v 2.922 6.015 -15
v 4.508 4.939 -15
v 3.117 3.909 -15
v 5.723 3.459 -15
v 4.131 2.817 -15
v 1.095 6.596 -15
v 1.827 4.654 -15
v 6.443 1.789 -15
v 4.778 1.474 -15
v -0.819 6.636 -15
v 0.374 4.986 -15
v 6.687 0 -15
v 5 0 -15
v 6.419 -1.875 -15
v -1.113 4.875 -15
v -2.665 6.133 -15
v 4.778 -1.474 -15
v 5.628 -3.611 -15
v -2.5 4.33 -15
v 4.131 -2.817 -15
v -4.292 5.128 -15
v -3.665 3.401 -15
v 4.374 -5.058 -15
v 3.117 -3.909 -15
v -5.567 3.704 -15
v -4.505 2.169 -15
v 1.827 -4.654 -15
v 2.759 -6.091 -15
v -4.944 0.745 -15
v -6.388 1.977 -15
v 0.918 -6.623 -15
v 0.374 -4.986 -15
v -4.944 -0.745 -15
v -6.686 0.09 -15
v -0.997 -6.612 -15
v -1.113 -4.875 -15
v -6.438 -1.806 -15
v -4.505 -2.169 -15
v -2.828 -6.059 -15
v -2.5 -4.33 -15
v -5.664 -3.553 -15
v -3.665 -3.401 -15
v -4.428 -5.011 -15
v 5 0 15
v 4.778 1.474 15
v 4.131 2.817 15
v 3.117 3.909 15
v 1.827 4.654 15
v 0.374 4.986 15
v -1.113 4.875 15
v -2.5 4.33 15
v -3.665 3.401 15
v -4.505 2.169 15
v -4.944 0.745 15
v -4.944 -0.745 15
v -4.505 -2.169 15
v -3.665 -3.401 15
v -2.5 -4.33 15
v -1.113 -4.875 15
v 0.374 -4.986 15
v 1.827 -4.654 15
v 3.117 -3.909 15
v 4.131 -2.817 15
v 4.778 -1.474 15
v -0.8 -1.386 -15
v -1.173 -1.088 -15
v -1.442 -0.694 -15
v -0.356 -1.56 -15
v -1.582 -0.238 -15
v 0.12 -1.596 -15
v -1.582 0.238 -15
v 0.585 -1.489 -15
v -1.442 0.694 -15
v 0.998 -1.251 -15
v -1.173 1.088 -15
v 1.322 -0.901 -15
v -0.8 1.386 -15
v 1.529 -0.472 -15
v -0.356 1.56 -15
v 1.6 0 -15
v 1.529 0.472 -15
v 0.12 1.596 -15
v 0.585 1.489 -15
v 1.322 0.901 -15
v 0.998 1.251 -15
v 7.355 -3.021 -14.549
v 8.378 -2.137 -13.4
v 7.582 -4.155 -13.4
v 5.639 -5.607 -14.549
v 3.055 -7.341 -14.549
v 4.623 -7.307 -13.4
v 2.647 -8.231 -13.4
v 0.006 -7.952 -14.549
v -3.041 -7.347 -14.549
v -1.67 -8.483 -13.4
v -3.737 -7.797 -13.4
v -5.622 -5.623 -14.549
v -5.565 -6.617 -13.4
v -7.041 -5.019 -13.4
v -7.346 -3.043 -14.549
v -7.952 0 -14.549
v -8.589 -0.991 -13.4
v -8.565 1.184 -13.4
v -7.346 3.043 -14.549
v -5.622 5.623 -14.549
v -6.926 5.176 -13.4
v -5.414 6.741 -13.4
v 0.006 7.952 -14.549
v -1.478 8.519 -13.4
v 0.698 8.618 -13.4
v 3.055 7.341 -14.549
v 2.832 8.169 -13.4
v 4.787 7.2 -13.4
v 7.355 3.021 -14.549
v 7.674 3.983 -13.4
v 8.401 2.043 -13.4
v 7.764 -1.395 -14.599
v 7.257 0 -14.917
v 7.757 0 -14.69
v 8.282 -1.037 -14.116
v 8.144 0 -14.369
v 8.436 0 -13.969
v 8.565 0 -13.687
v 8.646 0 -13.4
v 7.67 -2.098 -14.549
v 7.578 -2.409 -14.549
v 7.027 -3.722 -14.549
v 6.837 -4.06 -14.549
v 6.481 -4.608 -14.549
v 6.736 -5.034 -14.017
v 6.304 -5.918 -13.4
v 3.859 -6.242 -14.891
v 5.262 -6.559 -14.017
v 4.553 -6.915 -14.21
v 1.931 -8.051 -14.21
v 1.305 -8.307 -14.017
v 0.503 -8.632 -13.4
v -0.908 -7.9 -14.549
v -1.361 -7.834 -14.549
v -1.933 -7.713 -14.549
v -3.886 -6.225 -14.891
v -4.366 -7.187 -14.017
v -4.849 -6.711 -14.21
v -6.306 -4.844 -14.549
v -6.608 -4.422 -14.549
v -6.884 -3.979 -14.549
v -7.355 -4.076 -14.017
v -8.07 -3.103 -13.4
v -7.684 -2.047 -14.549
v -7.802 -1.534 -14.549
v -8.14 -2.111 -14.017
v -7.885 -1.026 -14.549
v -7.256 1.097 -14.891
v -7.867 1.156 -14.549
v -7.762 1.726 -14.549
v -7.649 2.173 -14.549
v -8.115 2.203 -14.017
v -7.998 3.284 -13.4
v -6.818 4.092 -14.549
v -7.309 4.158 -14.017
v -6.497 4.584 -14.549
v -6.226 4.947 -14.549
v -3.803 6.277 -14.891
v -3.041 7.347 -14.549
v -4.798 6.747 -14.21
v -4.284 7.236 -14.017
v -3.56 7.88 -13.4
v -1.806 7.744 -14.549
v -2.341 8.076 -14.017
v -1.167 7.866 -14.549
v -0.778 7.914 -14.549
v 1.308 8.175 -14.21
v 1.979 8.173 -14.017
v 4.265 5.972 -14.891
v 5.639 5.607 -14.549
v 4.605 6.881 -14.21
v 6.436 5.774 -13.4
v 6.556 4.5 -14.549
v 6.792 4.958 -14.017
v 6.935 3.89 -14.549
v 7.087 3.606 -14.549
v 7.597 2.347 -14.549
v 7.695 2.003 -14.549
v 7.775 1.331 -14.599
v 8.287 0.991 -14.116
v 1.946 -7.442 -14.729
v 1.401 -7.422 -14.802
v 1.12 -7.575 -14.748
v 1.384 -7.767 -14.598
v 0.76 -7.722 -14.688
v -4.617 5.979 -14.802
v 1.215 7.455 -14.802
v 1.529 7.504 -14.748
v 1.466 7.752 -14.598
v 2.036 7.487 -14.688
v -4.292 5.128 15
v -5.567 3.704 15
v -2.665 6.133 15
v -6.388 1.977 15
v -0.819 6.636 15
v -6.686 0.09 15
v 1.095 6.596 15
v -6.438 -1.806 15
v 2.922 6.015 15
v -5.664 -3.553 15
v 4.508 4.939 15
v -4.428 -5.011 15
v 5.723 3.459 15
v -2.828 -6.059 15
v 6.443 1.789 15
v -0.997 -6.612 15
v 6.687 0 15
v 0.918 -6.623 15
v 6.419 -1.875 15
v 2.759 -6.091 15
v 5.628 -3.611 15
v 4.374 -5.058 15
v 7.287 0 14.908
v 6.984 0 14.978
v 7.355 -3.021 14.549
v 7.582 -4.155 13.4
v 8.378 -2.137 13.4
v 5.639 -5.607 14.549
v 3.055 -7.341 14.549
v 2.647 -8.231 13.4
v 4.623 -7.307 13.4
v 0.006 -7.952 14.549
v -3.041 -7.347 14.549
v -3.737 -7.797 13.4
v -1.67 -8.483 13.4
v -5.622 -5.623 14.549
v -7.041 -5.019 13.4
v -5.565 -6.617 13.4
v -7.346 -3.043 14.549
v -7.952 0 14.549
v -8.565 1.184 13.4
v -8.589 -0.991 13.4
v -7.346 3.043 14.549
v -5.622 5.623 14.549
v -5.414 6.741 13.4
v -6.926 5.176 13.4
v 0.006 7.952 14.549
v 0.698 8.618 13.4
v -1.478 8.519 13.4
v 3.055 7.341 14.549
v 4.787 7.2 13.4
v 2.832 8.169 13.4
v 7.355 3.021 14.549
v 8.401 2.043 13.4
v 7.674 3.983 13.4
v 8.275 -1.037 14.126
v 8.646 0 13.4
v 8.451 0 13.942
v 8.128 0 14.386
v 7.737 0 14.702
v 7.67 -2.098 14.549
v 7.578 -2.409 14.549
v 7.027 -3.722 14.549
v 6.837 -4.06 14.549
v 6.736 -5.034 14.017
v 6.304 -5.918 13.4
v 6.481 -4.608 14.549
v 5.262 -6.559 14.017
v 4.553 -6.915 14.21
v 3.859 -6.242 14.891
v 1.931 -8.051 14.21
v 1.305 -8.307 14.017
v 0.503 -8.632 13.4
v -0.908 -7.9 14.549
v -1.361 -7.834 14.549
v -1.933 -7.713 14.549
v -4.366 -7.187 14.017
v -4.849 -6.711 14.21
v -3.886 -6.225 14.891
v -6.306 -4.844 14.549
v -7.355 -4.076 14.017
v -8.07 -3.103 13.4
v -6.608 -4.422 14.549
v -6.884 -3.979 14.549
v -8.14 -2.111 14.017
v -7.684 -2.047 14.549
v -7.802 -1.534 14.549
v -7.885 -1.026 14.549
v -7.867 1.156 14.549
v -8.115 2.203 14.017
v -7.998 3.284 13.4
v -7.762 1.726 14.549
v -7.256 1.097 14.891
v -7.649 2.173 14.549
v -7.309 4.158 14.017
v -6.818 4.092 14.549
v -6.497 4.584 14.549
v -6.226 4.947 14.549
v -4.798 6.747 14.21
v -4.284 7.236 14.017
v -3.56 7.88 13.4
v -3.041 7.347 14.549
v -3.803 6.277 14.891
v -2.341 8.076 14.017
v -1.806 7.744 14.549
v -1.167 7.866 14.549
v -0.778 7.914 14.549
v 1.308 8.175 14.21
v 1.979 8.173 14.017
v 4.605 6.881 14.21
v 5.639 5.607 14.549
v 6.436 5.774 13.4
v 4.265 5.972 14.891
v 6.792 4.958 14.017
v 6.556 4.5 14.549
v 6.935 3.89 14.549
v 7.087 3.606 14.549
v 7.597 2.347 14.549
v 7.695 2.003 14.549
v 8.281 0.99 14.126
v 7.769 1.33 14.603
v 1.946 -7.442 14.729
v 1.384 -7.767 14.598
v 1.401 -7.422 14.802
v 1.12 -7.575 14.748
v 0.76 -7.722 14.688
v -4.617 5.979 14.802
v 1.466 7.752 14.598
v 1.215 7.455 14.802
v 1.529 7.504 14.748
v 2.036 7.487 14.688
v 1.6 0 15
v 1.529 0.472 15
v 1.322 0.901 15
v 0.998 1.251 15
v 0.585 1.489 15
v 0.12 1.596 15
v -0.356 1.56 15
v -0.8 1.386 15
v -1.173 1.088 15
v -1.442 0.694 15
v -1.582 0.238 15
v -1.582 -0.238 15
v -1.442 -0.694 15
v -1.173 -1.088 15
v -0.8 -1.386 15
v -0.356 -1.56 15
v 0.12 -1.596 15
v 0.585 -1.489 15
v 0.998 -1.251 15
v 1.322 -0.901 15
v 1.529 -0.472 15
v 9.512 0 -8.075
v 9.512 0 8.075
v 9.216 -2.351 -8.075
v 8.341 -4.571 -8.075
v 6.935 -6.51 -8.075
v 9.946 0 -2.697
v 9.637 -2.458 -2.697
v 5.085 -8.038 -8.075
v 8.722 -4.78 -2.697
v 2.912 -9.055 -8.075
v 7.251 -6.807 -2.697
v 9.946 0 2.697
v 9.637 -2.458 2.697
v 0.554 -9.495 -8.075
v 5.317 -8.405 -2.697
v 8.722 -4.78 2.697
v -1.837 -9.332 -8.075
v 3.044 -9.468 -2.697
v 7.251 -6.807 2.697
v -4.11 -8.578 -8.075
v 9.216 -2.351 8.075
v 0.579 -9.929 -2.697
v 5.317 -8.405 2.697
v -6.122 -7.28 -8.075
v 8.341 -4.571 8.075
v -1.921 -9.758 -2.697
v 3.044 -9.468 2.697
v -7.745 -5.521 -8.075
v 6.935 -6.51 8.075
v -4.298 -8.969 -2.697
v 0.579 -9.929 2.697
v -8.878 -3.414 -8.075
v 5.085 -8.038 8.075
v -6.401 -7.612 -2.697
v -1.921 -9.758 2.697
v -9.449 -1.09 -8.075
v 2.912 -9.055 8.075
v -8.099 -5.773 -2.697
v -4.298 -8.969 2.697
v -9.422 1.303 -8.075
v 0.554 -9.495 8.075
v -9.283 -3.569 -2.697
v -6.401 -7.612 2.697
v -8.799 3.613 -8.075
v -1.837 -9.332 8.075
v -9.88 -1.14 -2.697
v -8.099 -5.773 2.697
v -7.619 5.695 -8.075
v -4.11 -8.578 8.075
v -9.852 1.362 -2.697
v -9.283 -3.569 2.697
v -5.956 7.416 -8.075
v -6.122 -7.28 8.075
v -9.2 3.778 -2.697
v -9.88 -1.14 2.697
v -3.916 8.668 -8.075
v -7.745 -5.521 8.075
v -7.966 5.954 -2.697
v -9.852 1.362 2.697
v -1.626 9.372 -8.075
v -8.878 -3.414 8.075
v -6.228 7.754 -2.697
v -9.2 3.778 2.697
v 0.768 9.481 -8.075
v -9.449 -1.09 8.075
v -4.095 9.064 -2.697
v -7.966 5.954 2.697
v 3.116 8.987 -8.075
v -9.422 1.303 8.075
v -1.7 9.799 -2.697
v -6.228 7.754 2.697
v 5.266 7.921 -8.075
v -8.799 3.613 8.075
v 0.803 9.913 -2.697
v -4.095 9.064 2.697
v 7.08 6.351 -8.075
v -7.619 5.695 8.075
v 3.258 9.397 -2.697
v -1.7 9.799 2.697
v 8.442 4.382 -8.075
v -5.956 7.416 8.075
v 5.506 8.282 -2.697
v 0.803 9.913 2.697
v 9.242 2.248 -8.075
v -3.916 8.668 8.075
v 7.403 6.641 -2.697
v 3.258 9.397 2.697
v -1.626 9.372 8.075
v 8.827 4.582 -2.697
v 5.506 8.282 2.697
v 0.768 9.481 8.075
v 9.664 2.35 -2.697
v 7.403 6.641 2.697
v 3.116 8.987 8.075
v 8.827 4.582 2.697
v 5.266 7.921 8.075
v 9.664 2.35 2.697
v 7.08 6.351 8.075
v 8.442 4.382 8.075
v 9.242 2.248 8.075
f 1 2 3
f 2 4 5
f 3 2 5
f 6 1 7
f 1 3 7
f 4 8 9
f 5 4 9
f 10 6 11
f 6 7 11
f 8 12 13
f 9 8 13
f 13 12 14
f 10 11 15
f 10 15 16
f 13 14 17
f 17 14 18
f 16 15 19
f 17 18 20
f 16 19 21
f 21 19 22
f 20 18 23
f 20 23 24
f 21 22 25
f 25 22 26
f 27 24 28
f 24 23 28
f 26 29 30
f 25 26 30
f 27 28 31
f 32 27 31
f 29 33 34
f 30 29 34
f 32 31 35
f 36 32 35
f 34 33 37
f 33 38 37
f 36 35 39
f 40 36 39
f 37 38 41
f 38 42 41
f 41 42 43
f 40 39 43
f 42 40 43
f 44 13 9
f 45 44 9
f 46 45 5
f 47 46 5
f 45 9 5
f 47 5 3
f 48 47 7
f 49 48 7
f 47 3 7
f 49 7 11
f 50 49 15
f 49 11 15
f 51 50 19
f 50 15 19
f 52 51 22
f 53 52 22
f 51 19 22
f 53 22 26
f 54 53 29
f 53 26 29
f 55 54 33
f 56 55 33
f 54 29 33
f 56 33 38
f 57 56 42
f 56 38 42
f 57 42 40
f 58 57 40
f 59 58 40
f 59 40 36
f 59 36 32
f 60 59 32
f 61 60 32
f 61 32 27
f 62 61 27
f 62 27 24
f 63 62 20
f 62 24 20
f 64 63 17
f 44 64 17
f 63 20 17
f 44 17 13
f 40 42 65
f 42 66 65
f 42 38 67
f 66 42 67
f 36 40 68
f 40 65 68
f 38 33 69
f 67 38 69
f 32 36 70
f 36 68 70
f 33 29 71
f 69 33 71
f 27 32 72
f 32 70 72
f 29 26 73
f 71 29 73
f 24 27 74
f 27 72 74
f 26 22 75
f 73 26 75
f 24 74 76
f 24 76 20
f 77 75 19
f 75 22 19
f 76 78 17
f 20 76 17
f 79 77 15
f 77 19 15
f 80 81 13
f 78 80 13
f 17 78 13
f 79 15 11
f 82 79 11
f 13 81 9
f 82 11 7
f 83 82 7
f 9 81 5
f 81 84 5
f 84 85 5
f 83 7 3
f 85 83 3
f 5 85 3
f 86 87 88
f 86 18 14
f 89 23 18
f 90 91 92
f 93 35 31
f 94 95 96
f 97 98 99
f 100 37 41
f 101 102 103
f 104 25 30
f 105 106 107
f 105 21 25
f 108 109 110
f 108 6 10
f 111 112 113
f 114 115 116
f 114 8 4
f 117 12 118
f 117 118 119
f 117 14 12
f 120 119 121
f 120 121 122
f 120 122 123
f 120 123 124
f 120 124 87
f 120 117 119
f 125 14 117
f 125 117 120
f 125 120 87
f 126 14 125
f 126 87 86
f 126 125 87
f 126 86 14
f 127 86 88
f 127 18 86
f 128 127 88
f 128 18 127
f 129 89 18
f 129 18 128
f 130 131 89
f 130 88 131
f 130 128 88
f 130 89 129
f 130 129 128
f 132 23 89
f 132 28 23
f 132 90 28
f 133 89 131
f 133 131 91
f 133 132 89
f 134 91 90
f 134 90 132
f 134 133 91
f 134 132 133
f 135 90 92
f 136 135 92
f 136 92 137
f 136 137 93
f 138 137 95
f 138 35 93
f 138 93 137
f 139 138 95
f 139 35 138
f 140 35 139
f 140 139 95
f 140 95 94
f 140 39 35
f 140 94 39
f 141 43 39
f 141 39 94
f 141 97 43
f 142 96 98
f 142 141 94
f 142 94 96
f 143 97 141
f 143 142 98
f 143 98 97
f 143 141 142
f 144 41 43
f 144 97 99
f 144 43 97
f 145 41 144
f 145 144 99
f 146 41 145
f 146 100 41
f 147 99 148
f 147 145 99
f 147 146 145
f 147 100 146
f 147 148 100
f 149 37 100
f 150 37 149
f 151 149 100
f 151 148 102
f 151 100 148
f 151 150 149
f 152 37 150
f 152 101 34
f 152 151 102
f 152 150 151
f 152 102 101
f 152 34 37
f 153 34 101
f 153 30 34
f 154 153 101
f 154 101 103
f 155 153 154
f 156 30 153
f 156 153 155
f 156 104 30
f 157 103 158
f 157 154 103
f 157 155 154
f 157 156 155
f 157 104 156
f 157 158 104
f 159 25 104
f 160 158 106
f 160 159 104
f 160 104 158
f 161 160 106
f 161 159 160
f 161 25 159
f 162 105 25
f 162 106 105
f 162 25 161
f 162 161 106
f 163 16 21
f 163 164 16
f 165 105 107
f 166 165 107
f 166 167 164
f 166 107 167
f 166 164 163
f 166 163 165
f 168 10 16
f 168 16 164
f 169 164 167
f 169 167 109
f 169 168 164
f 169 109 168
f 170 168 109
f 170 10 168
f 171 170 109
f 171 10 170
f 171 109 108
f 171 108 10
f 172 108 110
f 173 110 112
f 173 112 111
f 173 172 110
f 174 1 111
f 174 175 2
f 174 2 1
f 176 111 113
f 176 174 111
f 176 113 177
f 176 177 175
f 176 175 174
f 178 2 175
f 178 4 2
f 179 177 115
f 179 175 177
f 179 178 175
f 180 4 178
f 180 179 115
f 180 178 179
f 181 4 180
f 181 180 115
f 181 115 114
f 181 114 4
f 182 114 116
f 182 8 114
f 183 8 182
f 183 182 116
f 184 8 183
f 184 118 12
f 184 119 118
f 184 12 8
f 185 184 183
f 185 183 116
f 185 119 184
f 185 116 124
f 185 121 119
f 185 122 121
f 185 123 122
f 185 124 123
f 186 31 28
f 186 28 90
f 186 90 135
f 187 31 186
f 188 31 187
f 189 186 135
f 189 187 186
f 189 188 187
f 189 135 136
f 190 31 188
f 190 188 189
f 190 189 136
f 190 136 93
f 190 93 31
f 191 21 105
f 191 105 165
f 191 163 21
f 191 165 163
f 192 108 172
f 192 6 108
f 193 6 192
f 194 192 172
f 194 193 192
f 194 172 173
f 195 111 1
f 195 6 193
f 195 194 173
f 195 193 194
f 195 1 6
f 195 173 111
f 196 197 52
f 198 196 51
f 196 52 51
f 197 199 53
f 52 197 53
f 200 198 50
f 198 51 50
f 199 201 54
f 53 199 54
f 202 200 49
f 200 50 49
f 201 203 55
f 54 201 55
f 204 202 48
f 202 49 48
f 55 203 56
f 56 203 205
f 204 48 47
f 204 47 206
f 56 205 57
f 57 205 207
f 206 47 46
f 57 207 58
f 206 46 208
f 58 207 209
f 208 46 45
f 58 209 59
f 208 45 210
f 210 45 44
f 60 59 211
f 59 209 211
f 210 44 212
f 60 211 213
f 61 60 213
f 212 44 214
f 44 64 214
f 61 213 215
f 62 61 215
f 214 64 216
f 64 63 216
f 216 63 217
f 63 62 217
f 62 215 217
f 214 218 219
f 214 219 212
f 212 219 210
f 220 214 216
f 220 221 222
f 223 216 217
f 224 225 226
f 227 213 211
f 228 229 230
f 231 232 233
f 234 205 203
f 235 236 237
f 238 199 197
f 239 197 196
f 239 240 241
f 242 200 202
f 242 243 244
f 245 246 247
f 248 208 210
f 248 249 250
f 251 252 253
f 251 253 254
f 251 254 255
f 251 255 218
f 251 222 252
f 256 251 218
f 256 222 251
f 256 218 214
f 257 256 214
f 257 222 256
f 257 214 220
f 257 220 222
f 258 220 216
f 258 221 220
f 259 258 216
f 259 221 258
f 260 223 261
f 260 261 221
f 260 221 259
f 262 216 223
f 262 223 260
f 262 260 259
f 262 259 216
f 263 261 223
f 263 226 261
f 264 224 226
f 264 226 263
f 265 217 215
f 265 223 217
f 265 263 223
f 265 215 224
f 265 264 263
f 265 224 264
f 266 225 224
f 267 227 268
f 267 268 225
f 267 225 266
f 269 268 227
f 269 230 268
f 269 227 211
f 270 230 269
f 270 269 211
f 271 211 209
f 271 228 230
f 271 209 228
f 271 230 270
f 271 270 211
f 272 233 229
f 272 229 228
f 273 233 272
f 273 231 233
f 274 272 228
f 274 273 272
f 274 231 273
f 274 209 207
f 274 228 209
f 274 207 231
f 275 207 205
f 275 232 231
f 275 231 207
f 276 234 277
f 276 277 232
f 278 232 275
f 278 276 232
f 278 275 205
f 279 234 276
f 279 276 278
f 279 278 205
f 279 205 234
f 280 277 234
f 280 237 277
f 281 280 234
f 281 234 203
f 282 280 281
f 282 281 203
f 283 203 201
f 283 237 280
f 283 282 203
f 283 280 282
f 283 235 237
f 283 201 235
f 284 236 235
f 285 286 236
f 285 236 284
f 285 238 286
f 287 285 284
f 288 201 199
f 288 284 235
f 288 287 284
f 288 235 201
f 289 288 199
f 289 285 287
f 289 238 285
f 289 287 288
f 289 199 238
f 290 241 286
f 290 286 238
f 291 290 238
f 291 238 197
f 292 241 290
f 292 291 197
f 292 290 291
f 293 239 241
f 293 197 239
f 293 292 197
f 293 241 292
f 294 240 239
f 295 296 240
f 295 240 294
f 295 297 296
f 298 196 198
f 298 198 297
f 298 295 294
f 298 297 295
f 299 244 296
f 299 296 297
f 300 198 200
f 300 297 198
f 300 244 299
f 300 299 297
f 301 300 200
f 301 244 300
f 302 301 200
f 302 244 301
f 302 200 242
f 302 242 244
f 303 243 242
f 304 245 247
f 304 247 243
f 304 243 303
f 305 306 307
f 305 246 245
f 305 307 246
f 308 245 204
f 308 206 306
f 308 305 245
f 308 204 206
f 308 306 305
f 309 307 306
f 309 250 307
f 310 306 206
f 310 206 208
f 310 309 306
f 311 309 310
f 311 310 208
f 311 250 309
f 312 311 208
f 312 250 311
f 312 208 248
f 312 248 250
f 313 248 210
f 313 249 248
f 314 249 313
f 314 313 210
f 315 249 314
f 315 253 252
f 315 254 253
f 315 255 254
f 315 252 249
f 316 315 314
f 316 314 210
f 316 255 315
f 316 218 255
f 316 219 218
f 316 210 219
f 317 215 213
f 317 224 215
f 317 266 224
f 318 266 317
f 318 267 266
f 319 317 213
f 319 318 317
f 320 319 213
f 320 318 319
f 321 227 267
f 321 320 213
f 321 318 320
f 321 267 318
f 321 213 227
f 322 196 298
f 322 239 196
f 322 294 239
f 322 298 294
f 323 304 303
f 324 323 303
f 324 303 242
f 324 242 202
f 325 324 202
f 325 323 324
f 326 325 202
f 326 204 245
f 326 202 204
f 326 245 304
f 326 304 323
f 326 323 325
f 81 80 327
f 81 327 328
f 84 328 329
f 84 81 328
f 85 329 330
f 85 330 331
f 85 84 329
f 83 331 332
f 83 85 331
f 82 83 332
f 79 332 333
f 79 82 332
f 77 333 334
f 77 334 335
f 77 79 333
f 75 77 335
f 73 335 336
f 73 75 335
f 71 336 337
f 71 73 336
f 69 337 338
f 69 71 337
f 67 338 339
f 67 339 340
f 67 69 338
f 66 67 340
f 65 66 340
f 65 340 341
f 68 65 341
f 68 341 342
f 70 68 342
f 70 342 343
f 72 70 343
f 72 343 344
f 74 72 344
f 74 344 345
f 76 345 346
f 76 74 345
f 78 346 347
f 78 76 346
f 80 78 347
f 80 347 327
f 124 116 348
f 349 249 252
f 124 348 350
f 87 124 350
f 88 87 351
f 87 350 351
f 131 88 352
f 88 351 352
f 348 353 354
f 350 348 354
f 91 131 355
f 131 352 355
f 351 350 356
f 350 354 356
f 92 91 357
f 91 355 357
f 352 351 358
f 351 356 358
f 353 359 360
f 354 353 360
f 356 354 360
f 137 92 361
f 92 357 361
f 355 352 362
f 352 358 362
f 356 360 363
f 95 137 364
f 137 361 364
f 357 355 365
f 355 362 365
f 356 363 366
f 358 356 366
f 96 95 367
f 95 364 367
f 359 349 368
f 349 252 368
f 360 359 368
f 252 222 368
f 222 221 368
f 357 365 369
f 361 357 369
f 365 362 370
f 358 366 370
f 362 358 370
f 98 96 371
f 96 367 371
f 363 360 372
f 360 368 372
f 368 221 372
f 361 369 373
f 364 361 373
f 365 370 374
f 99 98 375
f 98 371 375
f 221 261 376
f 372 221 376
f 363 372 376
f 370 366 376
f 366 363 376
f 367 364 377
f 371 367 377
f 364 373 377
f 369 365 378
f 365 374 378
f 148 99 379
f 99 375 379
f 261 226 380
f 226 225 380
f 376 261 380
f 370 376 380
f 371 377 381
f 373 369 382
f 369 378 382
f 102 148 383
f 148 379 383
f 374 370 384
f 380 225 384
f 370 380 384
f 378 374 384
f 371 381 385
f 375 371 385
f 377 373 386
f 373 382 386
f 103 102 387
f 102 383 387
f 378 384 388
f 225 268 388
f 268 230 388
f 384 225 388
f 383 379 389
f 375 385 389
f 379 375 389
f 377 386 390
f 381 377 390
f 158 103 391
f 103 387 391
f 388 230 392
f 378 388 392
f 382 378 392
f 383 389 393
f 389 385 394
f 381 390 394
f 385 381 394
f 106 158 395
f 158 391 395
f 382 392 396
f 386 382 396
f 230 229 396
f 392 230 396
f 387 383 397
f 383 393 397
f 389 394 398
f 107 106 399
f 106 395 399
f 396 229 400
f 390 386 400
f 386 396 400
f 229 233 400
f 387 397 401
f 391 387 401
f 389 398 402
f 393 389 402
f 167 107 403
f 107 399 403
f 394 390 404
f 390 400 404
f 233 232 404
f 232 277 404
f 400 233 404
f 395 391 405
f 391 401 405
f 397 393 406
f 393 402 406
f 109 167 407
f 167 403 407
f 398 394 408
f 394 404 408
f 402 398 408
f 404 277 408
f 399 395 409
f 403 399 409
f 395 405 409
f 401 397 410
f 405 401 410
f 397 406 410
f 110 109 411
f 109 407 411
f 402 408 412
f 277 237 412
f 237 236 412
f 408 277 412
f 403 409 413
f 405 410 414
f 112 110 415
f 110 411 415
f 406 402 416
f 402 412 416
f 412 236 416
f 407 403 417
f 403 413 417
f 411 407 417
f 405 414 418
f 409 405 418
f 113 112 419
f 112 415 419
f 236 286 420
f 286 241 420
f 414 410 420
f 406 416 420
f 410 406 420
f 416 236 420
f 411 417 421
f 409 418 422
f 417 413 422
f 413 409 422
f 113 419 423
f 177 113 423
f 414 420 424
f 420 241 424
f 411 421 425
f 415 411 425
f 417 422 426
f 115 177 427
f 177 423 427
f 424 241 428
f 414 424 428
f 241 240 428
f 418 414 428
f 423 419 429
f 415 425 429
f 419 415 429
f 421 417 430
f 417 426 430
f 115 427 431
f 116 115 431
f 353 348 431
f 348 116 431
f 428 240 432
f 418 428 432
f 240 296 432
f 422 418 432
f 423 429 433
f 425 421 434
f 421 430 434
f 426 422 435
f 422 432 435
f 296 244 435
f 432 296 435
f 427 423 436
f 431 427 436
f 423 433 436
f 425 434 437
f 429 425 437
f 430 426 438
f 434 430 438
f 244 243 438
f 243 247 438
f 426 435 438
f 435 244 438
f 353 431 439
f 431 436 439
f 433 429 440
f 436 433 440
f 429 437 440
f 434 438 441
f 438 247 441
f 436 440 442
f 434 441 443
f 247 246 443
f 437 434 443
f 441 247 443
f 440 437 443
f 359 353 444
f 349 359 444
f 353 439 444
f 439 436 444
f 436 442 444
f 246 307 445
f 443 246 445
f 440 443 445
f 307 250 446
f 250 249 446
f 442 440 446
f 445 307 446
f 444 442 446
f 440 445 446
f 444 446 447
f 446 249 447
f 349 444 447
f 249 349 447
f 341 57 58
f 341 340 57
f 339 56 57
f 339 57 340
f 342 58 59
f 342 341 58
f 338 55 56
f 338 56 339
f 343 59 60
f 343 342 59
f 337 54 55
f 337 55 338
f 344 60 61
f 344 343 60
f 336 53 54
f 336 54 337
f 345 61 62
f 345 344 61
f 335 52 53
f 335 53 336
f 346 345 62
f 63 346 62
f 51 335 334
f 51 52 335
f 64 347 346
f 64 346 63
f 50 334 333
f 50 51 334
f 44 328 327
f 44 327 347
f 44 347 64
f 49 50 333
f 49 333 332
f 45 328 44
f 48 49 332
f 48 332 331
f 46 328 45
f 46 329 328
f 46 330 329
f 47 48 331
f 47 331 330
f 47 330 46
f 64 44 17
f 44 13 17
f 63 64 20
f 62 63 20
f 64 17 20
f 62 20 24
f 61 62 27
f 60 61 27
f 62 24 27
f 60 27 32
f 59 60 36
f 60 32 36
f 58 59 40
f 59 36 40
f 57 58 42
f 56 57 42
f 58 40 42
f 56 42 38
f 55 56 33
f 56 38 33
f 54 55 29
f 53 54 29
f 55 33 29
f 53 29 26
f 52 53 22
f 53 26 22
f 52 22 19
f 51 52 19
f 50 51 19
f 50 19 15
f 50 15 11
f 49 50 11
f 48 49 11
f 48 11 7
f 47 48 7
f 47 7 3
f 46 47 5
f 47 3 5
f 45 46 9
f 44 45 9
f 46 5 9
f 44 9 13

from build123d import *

# Parameters (mm, degrees)
VERRUNDUNG1_R                        = 2
AUFSATZ_LINEAR_AUSTRAGEN1_DEPTH      = 15
AUFSATZ_LINEAR_AUSTRAGEN1_DEPTH_BACK = 15
SKIZZE2_R                            = 5
SKIZZE2_R_2                          = 1.6


with BuildPart() as part:
    # Skizze1 → Rotation1 (revolve)
    with BuildSketch(Plane(origin=(0, 0, 0), x_dir=(0, 0, -1), z_dir=(1, 0, 0)), mode=Mode.PRIVATE) as rotation1_sk:
        with BuildLine():
            Line((-15, 5), (15, 5))
            Line((15, 5), (15, 8.299310869))
            ThreePointArc((15, 8.299310869), (0, 10), (-15, 8.299310869))
            Line((-15, 8.299310869), (-15, 5))
        make_face()
    revolve(rotation1_sk.sketch.rotate(Axis((0, 0, 18.551269556), (0, 0, -1)), 90), axis=Axis((0, 0, 18.551269556), (0, 0, -1)))

    # Verrundung1
    verrundung1_edges = [part.edges().sort_by_distance(p)[0] for p in [
        (-8.299310869, 0, 15),
        (-8.299310869, 0, -15),
    ]]
    fillet(verrundung1_edges, radius=VERRUNDUNG1_R)


with BuildPart() as body_2:
    # Skizze2 → Aufsatz-Linear austragen1 (new, two sides: drawn at the far end of the back side and taken through both)
    with BuildSketch(Plane.XY.offset(-AUFSATZ_LINEAR_AUSTRAGEN1_DEPTH_BACK)):
        Circle(SKIZZE2_R)
        Circle(SKIZZE2_R_2, mode=Mode.SUBTRACT)
    extrude(amount=AUFSATZ_LINEAR_AUSTRAGEN1_DEPTH + AUFSATZ_LINEAR_AUSTRAGEN1_DEPTH_BACK)


solid = Compound([part.part, body_2.part])
